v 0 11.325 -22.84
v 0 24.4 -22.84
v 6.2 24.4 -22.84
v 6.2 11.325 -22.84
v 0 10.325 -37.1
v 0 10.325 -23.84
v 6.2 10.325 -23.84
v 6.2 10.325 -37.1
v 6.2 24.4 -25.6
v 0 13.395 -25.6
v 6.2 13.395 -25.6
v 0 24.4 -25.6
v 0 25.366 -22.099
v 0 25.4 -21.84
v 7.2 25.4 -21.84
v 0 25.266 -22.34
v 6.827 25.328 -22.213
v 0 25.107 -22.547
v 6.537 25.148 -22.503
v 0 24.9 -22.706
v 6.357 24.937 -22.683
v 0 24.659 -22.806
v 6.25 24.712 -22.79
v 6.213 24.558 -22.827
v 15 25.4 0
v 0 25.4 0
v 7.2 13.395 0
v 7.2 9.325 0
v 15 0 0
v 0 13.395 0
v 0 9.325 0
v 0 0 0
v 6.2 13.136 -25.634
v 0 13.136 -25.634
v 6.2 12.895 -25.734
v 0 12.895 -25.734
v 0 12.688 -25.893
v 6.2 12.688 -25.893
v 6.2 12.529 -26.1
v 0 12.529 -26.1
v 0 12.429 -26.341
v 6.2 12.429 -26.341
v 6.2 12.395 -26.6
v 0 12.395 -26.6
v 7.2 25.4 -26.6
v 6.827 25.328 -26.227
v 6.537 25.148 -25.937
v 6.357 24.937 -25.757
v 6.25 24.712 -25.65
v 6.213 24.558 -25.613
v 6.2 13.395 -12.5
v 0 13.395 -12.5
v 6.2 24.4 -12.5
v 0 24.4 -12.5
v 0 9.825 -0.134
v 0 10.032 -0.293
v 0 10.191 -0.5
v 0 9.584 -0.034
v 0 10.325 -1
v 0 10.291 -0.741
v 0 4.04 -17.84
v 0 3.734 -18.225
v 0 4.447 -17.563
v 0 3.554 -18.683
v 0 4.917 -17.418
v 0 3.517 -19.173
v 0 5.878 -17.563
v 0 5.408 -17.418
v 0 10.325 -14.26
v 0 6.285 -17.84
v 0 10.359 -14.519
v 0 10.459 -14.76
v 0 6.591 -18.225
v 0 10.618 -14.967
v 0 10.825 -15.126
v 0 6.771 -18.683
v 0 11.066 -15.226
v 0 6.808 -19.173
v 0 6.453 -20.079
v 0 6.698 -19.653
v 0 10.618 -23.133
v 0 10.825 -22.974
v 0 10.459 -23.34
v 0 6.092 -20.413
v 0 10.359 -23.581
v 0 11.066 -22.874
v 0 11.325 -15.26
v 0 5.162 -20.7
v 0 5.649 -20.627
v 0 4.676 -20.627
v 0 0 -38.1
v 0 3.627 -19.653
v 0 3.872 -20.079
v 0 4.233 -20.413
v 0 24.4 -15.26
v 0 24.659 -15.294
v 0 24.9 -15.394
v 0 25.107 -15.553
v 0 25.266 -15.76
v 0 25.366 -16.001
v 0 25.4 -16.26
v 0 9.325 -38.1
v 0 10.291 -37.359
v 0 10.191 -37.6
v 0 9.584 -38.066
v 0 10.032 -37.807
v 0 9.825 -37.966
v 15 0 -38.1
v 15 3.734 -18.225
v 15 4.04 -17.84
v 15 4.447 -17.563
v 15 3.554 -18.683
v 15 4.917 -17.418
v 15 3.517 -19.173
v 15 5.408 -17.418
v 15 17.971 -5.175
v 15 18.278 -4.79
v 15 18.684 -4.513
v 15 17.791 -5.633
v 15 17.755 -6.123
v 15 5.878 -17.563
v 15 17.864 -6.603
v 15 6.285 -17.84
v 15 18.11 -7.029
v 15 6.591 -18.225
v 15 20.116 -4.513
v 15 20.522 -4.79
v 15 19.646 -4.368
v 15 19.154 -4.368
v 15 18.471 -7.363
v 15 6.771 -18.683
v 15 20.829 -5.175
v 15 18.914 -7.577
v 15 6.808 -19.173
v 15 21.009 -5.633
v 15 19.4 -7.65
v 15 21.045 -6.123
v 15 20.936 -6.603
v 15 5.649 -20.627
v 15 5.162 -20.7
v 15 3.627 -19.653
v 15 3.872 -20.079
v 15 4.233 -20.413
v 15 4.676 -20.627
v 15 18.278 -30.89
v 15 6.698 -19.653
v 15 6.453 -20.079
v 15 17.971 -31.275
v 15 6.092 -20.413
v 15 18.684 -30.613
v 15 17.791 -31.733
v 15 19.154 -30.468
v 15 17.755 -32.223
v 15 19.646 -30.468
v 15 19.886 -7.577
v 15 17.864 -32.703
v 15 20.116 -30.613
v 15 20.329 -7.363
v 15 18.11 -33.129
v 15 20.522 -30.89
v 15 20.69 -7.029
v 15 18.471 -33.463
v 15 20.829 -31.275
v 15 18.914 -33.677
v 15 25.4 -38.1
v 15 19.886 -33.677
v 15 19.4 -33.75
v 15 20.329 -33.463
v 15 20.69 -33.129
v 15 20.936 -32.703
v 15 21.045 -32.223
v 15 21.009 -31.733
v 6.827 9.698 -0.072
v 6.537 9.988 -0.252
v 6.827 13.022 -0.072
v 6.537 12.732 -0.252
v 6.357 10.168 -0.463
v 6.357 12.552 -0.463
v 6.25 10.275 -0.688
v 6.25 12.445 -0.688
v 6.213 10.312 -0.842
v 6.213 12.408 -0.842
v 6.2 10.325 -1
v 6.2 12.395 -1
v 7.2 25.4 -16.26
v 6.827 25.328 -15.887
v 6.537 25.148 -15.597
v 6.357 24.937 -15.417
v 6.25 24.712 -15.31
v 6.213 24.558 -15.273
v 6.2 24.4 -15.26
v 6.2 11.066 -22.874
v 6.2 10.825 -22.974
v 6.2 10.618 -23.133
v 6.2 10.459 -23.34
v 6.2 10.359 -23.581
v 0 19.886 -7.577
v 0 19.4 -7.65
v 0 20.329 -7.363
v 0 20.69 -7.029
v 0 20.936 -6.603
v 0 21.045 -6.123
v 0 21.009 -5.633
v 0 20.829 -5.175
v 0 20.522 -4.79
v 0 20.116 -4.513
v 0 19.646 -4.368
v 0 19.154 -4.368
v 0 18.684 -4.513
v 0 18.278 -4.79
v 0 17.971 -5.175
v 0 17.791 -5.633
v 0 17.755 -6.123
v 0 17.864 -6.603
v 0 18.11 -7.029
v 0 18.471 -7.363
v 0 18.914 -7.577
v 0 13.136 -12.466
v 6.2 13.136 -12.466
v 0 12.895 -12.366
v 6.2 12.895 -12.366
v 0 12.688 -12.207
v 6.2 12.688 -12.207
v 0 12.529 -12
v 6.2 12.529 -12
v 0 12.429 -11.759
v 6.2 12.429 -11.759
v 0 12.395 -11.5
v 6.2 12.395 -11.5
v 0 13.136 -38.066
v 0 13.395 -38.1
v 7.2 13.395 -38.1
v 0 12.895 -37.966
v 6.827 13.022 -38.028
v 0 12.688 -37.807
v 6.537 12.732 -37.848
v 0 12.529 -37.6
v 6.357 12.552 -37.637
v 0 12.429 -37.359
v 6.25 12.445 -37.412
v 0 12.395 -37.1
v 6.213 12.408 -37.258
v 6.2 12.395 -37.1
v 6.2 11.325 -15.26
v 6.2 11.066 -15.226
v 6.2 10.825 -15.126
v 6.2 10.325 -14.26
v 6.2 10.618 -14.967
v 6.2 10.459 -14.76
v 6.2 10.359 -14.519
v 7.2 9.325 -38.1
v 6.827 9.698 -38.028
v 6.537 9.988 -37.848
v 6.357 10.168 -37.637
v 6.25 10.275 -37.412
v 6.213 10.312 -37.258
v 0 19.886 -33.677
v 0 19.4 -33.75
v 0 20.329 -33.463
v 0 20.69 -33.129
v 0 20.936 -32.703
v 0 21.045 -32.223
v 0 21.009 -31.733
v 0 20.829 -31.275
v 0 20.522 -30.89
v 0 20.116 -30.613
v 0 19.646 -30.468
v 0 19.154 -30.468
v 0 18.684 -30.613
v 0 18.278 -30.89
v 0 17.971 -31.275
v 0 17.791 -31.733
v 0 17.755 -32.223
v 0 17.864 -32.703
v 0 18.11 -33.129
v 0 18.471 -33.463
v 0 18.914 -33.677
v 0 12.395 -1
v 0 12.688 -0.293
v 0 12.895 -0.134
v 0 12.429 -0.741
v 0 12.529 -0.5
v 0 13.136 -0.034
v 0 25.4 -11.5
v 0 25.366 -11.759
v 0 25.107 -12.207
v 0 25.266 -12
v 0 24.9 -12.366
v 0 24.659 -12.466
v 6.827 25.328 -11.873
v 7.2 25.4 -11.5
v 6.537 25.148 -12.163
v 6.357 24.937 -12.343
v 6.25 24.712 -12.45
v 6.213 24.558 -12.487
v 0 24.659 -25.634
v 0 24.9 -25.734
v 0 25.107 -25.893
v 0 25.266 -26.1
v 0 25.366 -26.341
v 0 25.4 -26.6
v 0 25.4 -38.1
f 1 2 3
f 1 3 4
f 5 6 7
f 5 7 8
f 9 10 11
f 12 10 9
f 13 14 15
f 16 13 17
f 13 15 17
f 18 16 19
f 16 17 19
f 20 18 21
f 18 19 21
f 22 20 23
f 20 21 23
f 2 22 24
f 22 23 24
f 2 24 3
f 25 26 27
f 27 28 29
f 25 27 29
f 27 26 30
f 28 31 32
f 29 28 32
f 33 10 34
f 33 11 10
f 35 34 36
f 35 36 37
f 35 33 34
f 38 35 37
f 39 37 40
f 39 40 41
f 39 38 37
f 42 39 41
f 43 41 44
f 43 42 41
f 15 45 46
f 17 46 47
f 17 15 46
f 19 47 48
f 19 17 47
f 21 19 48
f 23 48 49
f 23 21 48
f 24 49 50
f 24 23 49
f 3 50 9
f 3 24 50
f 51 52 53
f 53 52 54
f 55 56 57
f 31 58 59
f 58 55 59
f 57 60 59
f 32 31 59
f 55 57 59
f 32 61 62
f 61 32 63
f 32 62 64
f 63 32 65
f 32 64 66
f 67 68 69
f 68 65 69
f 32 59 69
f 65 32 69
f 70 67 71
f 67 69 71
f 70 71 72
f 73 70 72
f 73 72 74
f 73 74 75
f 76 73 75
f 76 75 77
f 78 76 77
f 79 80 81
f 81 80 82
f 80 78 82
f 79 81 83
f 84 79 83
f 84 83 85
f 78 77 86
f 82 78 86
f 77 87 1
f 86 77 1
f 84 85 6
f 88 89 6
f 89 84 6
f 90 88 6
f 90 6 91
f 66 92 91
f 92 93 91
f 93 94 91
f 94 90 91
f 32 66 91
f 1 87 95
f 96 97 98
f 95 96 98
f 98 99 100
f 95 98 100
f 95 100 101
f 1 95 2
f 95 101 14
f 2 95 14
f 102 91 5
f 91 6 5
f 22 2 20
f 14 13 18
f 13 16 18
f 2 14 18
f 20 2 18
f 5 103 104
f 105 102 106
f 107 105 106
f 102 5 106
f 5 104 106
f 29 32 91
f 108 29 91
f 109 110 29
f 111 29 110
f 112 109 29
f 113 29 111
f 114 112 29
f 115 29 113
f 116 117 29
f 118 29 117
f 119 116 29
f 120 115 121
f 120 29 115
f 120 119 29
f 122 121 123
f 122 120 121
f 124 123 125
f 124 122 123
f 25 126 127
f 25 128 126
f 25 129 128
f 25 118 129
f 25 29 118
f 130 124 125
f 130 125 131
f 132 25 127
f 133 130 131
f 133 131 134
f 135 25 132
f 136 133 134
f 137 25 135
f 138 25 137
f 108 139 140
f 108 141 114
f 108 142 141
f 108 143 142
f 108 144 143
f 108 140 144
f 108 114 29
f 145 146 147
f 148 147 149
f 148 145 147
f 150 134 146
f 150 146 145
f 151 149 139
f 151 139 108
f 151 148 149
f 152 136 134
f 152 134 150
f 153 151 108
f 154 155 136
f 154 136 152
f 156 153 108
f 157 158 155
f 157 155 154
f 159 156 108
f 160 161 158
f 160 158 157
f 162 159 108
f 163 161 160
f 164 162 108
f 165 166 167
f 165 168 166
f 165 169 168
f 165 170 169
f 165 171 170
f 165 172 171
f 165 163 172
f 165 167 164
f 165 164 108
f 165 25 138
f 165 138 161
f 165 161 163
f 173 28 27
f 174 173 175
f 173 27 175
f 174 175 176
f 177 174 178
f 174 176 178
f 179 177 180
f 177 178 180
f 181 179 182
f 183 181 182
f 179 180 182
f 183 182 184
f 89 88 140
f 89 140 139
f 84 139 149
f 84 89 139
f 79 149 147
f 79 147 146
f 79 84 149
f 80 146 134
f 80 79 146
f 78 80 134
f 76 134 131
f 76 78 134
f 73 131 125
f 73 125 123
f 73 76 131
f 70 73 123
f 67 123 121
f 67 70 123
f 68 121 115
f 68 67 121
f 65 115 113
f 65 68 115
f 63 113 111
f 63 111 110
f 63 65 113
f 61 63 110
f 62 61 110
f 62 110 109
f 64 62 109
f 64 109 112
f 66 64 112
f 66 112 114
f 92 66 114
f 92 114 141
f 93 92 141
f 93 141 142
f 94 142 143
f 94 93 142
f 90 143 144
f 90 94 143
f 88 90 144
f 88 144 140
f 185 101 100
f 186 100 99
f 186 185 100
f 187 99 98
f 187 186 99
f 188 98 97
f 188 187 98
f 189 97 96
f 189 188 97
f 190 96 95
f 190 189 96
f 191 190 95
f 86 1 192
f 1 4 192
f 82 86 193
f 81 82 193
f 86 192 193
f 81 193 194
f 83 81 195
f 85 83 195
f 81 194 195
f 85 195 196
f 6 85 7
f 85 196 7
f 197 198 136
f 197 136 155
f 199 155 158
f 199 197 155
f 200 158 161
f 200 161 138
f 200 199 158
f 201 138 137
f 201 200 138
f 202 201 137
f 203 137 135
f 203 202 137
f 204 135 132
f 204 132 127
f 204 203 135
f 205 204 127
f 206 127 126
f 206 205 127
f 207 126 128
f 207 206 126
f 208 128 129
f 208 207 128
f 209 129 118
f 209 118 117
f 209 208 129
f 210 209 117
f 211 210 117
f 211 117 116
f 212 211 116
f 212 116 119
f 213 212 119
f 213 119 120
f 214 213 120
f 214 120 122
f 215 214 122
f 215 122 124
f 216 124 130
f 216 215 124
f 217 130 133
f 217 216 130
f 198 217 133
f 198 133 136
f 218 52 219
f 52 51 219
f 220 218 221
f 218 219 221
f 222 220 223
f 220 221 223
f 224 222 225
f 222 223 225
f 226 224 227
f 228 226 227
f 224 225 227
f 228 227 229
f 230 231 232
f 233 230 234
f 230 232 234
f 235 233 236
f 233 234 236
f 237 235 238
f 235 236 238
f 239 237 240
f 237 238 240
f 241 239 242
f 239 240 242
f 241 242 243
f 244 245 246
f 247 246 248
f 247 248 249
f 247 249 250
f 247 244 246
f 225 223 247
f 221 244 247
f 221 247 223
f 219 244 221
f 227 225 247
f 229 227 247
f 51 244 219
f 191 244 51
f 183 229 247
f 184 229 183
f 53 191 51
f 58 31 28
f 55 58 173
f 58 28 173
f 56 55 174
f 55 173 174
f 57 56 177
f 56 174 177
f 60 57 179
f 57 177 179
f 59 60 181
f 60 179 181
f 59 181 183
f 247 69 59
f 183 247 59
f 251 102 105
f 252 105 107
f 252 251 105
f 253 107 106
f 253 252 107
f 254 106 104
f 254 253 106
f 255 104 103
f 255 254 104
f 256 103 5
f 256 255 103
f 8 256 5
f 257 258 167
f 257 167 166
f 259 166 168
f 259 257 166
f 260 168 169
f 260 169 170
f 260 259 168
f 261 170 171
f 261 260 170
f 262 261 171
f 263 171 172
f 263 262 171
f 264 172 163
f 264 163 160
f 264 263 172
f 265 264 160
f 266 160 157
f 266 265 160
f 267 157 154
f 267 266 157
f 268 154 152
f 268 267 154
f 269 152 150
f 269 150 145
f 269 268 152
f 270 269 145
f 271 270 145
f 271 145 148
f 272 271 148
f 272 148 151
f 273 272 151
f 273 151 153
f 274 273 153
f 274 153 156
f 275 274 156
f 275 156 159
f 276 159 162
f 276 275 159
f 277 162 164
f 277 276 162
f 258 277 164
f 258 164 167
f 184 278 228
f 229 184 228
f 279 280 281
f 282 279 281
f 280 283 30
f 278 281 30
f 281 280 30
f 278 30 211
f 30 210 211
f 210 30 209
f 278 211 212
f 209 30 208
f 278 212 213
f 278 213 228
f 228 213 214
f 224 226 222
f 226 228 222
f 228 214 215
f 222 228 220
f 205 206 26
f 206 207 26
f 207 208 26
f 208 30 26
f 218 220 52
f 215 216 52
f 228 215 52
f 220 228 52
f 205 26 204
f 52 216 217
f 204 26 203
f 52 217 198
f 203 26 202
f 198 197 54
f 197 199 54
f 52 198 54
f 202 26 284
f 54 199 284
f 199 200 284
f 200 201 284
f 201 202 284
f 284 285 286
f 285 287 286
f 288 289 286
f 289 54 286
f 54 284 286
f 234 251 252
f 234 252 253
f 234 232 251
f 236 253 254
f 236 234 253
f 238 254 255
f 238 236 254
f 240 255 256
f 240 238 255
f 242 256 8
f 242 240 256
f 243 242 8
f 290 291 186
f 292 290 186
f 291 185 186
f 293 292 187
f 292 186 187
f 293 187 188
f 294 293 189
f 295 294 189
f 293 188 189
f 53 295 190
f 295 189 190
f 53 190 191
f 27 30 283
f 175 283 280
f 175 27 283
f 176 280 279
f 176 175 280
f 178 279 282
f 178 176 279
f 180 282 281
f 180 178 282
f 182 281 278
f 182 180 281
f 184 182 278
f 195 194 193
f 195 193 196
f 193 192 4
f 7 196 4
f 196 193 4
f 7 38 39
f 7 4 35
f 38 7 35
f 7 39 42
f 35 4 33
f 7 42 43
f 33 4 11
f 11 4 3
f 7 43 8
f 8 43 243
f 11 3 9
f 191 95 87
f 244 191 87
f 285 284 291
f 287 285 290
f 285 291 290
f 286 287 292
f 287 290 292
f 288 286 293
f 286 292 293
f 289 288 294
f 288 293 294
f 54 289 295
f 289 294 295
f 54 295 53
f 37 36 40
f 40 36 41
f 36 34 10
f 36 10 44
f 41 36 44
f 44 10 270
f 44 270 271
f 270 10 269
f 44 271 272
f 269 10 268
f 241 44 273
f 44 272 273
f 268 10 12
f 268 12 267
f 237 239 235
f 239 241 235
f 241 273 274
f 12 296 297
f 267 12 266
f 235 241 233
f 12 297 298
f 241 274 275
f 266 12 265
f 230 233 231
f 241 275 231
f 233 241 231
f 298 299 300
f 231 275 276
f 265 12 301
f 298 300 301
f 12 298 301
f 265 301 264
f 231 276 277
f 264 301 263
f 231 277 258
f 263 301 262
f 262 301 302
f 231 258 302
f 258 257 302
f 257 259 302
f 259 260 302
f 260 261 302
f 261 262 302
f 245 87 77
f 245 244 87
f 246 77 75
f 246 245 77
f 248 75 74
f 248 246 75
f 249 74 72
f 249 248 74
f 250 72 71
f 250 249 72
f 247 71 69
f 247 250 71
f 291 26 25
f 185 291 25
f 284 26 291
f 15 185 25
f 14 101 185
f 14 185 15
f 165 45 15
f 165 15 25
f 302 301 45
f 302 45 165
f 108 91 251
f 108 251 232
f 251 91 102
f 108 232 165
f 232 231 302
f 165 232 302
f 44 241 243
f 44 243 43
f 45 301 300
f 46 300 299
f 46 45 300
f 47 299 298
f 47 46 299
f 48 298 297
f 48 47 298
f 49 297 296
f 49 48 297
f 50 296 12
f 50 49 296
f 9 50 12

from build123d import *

# Parameters (mm, degrees)
SKETCH1_W           = 38.1
SKETCH1_H           = 25.4
SKETCH1_R           = 1.65
BOSS_EXTRUDE2_DEPTH = 15
CUT_EXTRUDE1_DEPTH  = 6.2
FILLET1_R           = 1


with BuildPart() as part:
    # Sketch1 → Boss-Extrude2 (new body)
    with BuildSketch(Plane(origin=(0, 0, 0), x_dir=(0, 0, -1), z_dir=(1, 0, 0))):
        with Locations((19.05, 12.7)):
            Rectangle(SKETCH1_W, SKETCH1_H)
        with Locations((6, 19.4)):
            Circle(SKETCH1_R, mode=Mode.SUBTRACT)
        with Locations((19.05, 5.1625)):
            Circle(SKETCH1_R, mode=Mode.SUBTRACT)
        with Locations((32.1, 19.4)):
            Circle(SKETCH1_R, mode=Mode.SUBTRACT)
    extrude(amount=BOSS_EXTRUDE2_DEPTH)

    # Sketch1<9> → Cut-Extrude1 (cut)
    with BuildSketch(Plane(origin=(0, 0, 0), x_dir=(0, 0, -1), z_dir=(1, 0, 0))):
        Polygon((12.5, 12.395), (0, 12.395), (0, 10.325), (15.26, 10.325), (15.26, 25.4), (12.5, 25.4), align=None)
        Polygon((25.6, 25.4), (22.84, 25.4), (22.84, 10.325), (38.1, 10.325), (38.1, 12.395), (25.6, 12.395), align=None)
    extrude(amount=CUT_EXTRUDE1_DEPTH, mode=Mode.SUBTRACT)

    # Fillet1
    fillet1_edges = [part.edges().sort_by_distance(p)[0] for p in [
        (6.2, 25.4, -24.22),
        (6.2, 25.4, -13.88),
        (6.2, 11.36, -38.1),
        (6.2, 11.36, 0),
        (3.1, 25.4, -25.6),
        (3.1, 25.4, -22.84),
        (3.1, 25.4, -12.5),
        (3.1, 25.4, -15.26),
        (3.1, 10.325, 0),
        (3.1, 12.395, 0),
        (3.1, 12.395, -12.5),
        (3.1, 10.325, -15.26),
        (3.1, 10.325, -22.84),
        (3.1, 12.395, -25.6),
        (3.1, 10.325, -38.1),
        (3.1, 12.395, -38.1),
    ]]
    fillet(fillet1_edges, radius=FILLET1_R)


solid = part.part
